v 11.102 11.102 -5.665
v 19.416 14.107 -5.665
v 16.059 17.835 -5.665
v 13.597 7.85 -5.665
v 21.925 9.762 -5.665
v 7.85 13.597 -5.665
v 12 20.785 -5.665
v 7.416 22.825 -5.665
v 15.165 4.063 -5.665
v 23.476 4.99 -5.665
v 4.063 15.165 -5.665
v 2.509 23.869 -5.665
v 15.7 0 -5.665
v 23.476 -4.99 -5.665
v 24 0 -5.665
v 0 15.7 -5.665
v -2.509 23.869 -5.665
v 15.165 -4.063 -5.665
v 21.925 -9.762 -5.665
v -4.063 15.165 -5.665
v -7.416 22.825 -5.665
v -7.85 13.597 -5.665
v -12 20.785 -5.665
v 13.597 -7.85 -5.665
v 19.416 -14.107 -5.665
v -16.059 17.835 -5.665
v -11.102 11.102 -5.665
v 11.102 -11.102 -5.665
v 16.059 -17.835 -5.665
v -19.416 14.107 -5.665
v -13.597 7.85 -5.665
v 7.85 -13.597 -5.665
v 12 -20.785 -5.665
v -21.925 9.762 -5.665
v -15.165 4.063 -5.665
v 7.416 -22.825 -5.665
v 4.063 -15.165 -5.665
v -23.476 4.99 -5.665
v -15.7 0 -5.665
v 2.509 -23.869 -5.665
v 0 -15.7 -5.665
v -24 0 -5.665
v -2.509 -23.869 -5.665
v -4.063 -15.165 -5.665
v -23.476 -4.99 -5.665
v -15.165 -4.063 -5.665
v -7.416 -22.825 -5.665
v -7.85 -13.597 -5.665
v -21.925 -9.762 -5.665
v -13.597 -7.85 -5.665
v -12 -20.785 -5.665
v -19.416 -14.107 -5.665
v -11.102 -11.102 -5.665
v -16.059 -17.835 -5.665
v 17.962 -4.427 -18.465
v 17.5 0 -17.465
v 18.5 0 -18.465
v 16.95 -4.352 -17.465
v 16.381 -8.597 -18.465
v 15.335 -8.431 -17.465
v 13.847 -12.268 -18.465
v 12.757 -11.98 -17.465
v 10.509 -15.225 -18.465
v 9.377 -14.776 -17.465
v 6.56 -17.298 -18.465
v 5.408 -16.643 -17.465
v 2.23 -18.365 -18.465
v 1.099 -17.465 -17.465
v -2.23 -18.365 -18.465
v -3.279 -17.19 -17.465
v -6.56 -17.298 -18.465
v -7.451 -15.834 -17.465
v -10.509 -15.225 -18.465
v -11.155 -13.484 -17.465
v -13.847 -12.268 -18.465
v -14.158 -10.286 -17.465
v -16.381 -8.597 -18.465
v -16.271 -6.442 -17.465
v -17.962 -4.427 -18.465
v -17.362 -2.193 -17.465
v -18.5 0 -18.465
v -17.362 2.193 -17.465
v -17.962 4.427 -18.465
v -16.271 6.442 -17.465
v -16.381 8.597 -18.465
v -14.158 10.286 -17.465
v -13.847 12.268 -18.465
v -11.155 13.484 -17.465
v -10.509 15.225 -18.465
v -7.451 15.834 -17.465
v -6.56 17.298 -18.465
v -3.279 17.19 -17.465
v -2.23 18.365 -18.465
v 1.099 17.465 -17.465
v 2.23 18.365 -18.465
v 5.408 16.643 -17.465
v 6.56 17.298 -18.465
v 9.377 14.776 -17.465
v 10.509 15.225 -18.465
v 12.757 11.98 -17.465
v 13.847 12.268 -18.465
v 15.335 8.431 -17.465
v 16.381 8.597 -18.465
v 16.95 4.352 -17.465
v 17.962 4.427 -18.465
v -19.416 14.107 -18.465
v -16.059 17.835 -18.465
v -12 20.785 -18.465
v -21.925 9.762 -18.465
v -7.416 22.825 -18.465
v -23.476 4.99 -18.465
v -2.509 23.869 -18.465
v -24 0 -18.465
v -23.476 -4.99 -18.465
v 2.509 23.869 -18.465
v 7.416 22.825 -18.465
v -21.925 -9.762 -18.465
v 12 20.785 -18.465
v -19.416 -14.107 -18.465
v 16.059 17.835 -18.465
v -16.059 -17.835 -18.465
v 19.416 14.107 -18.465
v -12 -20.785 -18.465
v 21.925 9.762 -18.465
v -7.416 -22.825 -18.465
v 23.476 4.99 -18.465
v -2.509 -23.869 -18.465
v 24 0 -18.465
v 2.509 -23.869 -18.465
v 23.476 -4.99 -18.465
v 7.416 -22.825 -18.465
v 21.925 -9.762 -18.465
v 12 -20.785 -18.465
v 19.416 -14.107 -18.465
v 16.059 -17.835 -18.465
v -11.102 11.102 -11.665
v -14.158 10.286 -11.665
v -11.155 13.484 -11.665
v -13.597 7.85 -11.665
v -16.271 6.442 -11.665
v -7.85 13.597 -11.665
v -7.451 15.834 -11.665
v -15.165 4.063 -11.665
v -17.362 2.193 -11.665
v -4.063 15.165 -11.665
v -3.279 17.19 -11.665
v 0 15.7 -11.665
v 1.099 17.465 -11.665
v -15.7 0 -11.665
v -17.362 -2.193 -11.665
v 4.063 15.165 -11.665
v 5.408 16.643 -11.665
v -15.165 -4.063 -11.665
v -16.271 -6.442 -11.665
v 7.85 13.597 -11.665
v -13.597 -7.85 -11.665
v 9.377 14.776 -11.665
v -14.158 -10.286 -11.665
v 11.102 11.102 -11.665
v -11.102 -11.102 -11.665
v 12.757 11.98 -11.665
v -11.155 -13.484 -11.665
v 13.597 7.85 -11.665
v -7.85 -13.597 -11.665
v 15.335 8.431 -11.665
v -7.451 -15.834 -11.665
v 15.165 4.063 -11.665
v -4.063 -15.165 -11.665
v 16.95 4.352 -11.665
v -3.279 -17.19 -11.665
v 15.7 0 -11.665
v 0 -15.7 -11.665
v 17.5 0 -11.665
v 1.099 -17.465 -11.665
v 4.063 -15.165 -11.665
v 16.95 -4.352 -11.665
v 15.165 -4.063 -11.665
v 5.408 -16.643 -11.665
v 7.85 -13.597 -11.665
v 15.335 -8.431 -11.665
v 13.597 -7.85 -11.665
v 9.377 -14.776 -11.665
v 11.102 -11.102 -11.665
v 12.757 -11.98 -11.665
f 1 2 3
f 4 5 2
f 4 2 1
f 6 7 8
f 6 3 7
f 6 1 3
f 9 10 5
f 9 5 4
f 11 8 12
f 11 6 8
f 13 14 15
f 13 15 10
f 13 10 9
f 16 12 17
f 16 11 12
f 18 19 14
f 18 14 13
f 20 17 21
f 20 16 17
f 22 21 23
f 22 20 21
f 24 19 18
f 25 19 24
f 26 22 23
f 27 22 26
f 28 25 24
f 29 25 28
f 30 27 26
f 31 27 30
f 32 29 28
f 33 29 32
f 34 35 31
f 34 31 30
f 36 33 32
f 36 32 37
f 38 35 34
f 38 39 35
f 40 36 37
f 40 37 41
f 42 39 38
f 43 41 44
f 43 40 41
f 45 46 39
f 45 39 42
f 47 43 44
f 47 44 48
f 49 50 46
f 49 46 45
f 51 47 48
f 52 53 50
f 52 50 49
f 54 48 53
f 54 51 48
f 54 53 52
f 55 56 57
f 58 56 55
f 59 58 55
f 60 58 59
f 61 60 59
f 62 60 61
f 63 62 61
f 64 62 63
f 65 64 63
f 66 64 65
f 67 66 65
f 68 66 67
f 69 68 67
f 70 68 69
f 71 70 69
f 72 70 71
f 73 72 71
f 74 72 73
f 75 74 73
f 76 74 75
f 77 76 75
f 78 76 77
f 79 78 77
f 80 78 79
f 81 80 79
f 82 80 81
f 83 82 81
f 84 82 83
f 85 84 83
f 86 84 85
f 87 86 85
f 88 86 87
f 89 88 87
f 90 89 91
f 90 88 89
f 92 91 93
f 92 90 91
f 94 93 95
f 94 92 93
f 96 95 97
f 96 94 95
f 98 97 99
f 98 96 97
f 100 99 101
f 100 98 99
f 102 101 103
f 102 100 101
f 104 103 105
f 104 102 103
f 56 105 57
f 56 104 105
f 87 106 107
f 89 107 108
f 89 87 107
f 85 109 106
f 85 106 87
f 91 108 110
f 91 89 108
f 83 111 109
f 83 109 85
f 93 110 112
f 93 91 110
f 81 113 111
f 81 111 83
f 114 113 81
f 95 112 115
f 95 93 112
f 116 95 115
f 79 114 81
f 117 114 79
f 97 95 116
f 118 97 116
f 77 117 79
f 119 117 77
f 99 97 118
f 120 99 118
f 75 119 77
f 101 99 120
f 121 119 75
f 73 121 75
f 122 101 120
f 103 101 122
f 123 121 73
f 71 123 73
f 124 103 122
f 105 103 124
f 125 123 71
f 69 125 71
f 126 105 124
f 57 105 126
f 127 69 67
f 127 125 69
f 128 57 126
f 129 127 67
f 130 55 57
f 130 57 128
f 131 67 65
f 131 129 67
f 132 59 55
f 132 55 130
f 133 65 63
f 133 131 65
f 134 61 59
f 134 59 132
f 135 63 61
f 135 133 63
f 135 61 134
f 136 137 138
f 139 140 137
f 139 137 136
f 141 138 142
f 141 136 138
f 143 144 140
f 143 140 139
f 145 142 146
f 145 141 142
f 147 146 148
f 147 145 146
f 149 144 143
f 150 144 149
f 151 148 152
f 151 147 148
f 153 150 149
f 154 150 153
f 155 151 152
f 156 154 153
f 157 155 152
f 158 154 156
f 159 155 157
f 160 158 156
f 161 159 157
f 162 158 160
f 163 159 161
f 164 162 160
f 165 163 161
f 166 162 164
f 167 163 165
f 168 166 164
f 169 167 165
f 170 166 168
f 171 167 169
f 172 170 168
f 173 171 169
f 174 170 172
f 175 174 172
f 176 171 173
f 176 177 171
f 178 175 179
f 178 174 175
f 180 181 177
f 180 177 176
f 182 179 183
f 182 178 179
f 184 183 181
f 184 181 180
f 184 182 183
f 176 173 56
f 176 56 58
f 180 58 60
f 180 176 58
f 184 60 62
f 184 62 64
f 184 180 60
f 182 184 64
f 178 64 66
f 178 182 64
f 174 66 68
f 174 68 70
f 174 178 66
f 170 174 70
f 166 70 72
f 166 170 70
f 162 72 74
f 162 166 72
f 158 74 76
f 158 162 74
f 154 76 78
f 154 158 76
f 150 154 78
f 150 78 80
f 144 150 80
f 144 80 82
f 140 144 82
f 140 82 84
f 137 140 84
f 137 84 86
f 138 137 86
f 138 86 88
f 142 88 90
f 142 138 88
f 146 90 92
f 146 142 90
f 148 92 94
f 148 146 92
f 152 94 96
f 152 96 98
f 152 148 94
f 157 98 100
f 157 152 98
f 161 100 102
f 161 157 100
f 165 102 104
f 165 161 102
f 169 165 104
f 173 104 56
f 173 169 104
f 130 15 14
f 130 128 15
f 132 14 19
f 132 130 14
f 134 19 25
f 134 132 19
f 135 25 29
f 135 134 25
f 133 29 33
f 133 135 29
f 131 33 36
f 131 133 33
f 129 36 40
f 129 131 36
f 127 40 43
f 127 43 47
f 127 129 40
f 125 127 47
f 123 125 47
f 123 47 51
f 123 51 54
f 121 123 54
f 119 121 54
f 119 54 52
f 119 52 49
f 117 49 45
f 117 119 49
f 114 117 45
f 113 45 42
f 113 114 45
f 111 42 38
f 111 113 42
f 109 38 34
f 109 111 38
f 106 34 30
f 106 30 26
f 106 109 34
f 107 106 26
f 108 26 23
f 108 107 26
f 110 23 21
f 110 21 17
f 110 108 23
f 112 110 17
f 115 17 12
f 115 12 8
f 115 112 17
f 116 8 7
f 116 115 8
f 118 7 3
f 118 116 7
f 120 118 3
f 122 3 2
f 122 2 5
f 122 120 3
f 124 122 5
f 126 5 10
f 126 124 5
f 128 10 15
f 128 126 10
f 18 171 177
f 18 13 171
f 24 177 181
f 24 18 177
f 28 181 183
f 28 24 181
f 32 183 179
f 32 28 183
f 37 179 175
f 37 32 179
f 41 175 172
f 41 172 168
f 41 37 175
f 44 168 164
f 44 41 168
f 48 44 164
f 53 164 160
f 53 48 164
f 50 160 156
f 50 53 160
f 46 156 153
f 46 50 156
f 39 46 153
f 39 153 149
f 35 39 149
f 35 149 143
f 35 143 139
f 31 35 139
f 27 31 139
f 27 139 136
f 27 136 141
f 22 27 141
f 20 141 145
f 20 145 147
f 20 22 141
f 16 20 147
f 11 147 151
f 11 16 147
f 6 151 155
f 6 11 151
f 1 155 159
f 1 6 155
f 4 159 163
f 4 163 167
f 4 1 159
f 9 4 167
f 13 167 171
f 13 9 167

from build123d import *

# Parameters (mm, degrees)
CHANFREIN2_SIZE = 1


with BuildPart() as part:
    # Esquisse1 → Révolution1 (revolve)
    with BuildSketch(Plane(origin=(0, 0, 0), x_dir=(1, 0, 0), z_dir=(0, 1, 0))):
        Polygon((24, 5.665131579), (24, 18.465131579), (17.5, 18.465131579), (17.5, 11.665131579), (15.7, 11.665131579), (15.7, 5.665131579), align=None)
    revolve(axis=Axis((0, 0, 0), (0, 0, -1)))

    # Chanfrein2
    chanfrein2_edges = [part.edges().sort_by_distance(p)[0] for p in [
        (-17.5, 0, -18.465131579),
    ]]
    chamfer(chanfrein2_edges, length=CHANFREIN2_SIZE)


solid = part.part
